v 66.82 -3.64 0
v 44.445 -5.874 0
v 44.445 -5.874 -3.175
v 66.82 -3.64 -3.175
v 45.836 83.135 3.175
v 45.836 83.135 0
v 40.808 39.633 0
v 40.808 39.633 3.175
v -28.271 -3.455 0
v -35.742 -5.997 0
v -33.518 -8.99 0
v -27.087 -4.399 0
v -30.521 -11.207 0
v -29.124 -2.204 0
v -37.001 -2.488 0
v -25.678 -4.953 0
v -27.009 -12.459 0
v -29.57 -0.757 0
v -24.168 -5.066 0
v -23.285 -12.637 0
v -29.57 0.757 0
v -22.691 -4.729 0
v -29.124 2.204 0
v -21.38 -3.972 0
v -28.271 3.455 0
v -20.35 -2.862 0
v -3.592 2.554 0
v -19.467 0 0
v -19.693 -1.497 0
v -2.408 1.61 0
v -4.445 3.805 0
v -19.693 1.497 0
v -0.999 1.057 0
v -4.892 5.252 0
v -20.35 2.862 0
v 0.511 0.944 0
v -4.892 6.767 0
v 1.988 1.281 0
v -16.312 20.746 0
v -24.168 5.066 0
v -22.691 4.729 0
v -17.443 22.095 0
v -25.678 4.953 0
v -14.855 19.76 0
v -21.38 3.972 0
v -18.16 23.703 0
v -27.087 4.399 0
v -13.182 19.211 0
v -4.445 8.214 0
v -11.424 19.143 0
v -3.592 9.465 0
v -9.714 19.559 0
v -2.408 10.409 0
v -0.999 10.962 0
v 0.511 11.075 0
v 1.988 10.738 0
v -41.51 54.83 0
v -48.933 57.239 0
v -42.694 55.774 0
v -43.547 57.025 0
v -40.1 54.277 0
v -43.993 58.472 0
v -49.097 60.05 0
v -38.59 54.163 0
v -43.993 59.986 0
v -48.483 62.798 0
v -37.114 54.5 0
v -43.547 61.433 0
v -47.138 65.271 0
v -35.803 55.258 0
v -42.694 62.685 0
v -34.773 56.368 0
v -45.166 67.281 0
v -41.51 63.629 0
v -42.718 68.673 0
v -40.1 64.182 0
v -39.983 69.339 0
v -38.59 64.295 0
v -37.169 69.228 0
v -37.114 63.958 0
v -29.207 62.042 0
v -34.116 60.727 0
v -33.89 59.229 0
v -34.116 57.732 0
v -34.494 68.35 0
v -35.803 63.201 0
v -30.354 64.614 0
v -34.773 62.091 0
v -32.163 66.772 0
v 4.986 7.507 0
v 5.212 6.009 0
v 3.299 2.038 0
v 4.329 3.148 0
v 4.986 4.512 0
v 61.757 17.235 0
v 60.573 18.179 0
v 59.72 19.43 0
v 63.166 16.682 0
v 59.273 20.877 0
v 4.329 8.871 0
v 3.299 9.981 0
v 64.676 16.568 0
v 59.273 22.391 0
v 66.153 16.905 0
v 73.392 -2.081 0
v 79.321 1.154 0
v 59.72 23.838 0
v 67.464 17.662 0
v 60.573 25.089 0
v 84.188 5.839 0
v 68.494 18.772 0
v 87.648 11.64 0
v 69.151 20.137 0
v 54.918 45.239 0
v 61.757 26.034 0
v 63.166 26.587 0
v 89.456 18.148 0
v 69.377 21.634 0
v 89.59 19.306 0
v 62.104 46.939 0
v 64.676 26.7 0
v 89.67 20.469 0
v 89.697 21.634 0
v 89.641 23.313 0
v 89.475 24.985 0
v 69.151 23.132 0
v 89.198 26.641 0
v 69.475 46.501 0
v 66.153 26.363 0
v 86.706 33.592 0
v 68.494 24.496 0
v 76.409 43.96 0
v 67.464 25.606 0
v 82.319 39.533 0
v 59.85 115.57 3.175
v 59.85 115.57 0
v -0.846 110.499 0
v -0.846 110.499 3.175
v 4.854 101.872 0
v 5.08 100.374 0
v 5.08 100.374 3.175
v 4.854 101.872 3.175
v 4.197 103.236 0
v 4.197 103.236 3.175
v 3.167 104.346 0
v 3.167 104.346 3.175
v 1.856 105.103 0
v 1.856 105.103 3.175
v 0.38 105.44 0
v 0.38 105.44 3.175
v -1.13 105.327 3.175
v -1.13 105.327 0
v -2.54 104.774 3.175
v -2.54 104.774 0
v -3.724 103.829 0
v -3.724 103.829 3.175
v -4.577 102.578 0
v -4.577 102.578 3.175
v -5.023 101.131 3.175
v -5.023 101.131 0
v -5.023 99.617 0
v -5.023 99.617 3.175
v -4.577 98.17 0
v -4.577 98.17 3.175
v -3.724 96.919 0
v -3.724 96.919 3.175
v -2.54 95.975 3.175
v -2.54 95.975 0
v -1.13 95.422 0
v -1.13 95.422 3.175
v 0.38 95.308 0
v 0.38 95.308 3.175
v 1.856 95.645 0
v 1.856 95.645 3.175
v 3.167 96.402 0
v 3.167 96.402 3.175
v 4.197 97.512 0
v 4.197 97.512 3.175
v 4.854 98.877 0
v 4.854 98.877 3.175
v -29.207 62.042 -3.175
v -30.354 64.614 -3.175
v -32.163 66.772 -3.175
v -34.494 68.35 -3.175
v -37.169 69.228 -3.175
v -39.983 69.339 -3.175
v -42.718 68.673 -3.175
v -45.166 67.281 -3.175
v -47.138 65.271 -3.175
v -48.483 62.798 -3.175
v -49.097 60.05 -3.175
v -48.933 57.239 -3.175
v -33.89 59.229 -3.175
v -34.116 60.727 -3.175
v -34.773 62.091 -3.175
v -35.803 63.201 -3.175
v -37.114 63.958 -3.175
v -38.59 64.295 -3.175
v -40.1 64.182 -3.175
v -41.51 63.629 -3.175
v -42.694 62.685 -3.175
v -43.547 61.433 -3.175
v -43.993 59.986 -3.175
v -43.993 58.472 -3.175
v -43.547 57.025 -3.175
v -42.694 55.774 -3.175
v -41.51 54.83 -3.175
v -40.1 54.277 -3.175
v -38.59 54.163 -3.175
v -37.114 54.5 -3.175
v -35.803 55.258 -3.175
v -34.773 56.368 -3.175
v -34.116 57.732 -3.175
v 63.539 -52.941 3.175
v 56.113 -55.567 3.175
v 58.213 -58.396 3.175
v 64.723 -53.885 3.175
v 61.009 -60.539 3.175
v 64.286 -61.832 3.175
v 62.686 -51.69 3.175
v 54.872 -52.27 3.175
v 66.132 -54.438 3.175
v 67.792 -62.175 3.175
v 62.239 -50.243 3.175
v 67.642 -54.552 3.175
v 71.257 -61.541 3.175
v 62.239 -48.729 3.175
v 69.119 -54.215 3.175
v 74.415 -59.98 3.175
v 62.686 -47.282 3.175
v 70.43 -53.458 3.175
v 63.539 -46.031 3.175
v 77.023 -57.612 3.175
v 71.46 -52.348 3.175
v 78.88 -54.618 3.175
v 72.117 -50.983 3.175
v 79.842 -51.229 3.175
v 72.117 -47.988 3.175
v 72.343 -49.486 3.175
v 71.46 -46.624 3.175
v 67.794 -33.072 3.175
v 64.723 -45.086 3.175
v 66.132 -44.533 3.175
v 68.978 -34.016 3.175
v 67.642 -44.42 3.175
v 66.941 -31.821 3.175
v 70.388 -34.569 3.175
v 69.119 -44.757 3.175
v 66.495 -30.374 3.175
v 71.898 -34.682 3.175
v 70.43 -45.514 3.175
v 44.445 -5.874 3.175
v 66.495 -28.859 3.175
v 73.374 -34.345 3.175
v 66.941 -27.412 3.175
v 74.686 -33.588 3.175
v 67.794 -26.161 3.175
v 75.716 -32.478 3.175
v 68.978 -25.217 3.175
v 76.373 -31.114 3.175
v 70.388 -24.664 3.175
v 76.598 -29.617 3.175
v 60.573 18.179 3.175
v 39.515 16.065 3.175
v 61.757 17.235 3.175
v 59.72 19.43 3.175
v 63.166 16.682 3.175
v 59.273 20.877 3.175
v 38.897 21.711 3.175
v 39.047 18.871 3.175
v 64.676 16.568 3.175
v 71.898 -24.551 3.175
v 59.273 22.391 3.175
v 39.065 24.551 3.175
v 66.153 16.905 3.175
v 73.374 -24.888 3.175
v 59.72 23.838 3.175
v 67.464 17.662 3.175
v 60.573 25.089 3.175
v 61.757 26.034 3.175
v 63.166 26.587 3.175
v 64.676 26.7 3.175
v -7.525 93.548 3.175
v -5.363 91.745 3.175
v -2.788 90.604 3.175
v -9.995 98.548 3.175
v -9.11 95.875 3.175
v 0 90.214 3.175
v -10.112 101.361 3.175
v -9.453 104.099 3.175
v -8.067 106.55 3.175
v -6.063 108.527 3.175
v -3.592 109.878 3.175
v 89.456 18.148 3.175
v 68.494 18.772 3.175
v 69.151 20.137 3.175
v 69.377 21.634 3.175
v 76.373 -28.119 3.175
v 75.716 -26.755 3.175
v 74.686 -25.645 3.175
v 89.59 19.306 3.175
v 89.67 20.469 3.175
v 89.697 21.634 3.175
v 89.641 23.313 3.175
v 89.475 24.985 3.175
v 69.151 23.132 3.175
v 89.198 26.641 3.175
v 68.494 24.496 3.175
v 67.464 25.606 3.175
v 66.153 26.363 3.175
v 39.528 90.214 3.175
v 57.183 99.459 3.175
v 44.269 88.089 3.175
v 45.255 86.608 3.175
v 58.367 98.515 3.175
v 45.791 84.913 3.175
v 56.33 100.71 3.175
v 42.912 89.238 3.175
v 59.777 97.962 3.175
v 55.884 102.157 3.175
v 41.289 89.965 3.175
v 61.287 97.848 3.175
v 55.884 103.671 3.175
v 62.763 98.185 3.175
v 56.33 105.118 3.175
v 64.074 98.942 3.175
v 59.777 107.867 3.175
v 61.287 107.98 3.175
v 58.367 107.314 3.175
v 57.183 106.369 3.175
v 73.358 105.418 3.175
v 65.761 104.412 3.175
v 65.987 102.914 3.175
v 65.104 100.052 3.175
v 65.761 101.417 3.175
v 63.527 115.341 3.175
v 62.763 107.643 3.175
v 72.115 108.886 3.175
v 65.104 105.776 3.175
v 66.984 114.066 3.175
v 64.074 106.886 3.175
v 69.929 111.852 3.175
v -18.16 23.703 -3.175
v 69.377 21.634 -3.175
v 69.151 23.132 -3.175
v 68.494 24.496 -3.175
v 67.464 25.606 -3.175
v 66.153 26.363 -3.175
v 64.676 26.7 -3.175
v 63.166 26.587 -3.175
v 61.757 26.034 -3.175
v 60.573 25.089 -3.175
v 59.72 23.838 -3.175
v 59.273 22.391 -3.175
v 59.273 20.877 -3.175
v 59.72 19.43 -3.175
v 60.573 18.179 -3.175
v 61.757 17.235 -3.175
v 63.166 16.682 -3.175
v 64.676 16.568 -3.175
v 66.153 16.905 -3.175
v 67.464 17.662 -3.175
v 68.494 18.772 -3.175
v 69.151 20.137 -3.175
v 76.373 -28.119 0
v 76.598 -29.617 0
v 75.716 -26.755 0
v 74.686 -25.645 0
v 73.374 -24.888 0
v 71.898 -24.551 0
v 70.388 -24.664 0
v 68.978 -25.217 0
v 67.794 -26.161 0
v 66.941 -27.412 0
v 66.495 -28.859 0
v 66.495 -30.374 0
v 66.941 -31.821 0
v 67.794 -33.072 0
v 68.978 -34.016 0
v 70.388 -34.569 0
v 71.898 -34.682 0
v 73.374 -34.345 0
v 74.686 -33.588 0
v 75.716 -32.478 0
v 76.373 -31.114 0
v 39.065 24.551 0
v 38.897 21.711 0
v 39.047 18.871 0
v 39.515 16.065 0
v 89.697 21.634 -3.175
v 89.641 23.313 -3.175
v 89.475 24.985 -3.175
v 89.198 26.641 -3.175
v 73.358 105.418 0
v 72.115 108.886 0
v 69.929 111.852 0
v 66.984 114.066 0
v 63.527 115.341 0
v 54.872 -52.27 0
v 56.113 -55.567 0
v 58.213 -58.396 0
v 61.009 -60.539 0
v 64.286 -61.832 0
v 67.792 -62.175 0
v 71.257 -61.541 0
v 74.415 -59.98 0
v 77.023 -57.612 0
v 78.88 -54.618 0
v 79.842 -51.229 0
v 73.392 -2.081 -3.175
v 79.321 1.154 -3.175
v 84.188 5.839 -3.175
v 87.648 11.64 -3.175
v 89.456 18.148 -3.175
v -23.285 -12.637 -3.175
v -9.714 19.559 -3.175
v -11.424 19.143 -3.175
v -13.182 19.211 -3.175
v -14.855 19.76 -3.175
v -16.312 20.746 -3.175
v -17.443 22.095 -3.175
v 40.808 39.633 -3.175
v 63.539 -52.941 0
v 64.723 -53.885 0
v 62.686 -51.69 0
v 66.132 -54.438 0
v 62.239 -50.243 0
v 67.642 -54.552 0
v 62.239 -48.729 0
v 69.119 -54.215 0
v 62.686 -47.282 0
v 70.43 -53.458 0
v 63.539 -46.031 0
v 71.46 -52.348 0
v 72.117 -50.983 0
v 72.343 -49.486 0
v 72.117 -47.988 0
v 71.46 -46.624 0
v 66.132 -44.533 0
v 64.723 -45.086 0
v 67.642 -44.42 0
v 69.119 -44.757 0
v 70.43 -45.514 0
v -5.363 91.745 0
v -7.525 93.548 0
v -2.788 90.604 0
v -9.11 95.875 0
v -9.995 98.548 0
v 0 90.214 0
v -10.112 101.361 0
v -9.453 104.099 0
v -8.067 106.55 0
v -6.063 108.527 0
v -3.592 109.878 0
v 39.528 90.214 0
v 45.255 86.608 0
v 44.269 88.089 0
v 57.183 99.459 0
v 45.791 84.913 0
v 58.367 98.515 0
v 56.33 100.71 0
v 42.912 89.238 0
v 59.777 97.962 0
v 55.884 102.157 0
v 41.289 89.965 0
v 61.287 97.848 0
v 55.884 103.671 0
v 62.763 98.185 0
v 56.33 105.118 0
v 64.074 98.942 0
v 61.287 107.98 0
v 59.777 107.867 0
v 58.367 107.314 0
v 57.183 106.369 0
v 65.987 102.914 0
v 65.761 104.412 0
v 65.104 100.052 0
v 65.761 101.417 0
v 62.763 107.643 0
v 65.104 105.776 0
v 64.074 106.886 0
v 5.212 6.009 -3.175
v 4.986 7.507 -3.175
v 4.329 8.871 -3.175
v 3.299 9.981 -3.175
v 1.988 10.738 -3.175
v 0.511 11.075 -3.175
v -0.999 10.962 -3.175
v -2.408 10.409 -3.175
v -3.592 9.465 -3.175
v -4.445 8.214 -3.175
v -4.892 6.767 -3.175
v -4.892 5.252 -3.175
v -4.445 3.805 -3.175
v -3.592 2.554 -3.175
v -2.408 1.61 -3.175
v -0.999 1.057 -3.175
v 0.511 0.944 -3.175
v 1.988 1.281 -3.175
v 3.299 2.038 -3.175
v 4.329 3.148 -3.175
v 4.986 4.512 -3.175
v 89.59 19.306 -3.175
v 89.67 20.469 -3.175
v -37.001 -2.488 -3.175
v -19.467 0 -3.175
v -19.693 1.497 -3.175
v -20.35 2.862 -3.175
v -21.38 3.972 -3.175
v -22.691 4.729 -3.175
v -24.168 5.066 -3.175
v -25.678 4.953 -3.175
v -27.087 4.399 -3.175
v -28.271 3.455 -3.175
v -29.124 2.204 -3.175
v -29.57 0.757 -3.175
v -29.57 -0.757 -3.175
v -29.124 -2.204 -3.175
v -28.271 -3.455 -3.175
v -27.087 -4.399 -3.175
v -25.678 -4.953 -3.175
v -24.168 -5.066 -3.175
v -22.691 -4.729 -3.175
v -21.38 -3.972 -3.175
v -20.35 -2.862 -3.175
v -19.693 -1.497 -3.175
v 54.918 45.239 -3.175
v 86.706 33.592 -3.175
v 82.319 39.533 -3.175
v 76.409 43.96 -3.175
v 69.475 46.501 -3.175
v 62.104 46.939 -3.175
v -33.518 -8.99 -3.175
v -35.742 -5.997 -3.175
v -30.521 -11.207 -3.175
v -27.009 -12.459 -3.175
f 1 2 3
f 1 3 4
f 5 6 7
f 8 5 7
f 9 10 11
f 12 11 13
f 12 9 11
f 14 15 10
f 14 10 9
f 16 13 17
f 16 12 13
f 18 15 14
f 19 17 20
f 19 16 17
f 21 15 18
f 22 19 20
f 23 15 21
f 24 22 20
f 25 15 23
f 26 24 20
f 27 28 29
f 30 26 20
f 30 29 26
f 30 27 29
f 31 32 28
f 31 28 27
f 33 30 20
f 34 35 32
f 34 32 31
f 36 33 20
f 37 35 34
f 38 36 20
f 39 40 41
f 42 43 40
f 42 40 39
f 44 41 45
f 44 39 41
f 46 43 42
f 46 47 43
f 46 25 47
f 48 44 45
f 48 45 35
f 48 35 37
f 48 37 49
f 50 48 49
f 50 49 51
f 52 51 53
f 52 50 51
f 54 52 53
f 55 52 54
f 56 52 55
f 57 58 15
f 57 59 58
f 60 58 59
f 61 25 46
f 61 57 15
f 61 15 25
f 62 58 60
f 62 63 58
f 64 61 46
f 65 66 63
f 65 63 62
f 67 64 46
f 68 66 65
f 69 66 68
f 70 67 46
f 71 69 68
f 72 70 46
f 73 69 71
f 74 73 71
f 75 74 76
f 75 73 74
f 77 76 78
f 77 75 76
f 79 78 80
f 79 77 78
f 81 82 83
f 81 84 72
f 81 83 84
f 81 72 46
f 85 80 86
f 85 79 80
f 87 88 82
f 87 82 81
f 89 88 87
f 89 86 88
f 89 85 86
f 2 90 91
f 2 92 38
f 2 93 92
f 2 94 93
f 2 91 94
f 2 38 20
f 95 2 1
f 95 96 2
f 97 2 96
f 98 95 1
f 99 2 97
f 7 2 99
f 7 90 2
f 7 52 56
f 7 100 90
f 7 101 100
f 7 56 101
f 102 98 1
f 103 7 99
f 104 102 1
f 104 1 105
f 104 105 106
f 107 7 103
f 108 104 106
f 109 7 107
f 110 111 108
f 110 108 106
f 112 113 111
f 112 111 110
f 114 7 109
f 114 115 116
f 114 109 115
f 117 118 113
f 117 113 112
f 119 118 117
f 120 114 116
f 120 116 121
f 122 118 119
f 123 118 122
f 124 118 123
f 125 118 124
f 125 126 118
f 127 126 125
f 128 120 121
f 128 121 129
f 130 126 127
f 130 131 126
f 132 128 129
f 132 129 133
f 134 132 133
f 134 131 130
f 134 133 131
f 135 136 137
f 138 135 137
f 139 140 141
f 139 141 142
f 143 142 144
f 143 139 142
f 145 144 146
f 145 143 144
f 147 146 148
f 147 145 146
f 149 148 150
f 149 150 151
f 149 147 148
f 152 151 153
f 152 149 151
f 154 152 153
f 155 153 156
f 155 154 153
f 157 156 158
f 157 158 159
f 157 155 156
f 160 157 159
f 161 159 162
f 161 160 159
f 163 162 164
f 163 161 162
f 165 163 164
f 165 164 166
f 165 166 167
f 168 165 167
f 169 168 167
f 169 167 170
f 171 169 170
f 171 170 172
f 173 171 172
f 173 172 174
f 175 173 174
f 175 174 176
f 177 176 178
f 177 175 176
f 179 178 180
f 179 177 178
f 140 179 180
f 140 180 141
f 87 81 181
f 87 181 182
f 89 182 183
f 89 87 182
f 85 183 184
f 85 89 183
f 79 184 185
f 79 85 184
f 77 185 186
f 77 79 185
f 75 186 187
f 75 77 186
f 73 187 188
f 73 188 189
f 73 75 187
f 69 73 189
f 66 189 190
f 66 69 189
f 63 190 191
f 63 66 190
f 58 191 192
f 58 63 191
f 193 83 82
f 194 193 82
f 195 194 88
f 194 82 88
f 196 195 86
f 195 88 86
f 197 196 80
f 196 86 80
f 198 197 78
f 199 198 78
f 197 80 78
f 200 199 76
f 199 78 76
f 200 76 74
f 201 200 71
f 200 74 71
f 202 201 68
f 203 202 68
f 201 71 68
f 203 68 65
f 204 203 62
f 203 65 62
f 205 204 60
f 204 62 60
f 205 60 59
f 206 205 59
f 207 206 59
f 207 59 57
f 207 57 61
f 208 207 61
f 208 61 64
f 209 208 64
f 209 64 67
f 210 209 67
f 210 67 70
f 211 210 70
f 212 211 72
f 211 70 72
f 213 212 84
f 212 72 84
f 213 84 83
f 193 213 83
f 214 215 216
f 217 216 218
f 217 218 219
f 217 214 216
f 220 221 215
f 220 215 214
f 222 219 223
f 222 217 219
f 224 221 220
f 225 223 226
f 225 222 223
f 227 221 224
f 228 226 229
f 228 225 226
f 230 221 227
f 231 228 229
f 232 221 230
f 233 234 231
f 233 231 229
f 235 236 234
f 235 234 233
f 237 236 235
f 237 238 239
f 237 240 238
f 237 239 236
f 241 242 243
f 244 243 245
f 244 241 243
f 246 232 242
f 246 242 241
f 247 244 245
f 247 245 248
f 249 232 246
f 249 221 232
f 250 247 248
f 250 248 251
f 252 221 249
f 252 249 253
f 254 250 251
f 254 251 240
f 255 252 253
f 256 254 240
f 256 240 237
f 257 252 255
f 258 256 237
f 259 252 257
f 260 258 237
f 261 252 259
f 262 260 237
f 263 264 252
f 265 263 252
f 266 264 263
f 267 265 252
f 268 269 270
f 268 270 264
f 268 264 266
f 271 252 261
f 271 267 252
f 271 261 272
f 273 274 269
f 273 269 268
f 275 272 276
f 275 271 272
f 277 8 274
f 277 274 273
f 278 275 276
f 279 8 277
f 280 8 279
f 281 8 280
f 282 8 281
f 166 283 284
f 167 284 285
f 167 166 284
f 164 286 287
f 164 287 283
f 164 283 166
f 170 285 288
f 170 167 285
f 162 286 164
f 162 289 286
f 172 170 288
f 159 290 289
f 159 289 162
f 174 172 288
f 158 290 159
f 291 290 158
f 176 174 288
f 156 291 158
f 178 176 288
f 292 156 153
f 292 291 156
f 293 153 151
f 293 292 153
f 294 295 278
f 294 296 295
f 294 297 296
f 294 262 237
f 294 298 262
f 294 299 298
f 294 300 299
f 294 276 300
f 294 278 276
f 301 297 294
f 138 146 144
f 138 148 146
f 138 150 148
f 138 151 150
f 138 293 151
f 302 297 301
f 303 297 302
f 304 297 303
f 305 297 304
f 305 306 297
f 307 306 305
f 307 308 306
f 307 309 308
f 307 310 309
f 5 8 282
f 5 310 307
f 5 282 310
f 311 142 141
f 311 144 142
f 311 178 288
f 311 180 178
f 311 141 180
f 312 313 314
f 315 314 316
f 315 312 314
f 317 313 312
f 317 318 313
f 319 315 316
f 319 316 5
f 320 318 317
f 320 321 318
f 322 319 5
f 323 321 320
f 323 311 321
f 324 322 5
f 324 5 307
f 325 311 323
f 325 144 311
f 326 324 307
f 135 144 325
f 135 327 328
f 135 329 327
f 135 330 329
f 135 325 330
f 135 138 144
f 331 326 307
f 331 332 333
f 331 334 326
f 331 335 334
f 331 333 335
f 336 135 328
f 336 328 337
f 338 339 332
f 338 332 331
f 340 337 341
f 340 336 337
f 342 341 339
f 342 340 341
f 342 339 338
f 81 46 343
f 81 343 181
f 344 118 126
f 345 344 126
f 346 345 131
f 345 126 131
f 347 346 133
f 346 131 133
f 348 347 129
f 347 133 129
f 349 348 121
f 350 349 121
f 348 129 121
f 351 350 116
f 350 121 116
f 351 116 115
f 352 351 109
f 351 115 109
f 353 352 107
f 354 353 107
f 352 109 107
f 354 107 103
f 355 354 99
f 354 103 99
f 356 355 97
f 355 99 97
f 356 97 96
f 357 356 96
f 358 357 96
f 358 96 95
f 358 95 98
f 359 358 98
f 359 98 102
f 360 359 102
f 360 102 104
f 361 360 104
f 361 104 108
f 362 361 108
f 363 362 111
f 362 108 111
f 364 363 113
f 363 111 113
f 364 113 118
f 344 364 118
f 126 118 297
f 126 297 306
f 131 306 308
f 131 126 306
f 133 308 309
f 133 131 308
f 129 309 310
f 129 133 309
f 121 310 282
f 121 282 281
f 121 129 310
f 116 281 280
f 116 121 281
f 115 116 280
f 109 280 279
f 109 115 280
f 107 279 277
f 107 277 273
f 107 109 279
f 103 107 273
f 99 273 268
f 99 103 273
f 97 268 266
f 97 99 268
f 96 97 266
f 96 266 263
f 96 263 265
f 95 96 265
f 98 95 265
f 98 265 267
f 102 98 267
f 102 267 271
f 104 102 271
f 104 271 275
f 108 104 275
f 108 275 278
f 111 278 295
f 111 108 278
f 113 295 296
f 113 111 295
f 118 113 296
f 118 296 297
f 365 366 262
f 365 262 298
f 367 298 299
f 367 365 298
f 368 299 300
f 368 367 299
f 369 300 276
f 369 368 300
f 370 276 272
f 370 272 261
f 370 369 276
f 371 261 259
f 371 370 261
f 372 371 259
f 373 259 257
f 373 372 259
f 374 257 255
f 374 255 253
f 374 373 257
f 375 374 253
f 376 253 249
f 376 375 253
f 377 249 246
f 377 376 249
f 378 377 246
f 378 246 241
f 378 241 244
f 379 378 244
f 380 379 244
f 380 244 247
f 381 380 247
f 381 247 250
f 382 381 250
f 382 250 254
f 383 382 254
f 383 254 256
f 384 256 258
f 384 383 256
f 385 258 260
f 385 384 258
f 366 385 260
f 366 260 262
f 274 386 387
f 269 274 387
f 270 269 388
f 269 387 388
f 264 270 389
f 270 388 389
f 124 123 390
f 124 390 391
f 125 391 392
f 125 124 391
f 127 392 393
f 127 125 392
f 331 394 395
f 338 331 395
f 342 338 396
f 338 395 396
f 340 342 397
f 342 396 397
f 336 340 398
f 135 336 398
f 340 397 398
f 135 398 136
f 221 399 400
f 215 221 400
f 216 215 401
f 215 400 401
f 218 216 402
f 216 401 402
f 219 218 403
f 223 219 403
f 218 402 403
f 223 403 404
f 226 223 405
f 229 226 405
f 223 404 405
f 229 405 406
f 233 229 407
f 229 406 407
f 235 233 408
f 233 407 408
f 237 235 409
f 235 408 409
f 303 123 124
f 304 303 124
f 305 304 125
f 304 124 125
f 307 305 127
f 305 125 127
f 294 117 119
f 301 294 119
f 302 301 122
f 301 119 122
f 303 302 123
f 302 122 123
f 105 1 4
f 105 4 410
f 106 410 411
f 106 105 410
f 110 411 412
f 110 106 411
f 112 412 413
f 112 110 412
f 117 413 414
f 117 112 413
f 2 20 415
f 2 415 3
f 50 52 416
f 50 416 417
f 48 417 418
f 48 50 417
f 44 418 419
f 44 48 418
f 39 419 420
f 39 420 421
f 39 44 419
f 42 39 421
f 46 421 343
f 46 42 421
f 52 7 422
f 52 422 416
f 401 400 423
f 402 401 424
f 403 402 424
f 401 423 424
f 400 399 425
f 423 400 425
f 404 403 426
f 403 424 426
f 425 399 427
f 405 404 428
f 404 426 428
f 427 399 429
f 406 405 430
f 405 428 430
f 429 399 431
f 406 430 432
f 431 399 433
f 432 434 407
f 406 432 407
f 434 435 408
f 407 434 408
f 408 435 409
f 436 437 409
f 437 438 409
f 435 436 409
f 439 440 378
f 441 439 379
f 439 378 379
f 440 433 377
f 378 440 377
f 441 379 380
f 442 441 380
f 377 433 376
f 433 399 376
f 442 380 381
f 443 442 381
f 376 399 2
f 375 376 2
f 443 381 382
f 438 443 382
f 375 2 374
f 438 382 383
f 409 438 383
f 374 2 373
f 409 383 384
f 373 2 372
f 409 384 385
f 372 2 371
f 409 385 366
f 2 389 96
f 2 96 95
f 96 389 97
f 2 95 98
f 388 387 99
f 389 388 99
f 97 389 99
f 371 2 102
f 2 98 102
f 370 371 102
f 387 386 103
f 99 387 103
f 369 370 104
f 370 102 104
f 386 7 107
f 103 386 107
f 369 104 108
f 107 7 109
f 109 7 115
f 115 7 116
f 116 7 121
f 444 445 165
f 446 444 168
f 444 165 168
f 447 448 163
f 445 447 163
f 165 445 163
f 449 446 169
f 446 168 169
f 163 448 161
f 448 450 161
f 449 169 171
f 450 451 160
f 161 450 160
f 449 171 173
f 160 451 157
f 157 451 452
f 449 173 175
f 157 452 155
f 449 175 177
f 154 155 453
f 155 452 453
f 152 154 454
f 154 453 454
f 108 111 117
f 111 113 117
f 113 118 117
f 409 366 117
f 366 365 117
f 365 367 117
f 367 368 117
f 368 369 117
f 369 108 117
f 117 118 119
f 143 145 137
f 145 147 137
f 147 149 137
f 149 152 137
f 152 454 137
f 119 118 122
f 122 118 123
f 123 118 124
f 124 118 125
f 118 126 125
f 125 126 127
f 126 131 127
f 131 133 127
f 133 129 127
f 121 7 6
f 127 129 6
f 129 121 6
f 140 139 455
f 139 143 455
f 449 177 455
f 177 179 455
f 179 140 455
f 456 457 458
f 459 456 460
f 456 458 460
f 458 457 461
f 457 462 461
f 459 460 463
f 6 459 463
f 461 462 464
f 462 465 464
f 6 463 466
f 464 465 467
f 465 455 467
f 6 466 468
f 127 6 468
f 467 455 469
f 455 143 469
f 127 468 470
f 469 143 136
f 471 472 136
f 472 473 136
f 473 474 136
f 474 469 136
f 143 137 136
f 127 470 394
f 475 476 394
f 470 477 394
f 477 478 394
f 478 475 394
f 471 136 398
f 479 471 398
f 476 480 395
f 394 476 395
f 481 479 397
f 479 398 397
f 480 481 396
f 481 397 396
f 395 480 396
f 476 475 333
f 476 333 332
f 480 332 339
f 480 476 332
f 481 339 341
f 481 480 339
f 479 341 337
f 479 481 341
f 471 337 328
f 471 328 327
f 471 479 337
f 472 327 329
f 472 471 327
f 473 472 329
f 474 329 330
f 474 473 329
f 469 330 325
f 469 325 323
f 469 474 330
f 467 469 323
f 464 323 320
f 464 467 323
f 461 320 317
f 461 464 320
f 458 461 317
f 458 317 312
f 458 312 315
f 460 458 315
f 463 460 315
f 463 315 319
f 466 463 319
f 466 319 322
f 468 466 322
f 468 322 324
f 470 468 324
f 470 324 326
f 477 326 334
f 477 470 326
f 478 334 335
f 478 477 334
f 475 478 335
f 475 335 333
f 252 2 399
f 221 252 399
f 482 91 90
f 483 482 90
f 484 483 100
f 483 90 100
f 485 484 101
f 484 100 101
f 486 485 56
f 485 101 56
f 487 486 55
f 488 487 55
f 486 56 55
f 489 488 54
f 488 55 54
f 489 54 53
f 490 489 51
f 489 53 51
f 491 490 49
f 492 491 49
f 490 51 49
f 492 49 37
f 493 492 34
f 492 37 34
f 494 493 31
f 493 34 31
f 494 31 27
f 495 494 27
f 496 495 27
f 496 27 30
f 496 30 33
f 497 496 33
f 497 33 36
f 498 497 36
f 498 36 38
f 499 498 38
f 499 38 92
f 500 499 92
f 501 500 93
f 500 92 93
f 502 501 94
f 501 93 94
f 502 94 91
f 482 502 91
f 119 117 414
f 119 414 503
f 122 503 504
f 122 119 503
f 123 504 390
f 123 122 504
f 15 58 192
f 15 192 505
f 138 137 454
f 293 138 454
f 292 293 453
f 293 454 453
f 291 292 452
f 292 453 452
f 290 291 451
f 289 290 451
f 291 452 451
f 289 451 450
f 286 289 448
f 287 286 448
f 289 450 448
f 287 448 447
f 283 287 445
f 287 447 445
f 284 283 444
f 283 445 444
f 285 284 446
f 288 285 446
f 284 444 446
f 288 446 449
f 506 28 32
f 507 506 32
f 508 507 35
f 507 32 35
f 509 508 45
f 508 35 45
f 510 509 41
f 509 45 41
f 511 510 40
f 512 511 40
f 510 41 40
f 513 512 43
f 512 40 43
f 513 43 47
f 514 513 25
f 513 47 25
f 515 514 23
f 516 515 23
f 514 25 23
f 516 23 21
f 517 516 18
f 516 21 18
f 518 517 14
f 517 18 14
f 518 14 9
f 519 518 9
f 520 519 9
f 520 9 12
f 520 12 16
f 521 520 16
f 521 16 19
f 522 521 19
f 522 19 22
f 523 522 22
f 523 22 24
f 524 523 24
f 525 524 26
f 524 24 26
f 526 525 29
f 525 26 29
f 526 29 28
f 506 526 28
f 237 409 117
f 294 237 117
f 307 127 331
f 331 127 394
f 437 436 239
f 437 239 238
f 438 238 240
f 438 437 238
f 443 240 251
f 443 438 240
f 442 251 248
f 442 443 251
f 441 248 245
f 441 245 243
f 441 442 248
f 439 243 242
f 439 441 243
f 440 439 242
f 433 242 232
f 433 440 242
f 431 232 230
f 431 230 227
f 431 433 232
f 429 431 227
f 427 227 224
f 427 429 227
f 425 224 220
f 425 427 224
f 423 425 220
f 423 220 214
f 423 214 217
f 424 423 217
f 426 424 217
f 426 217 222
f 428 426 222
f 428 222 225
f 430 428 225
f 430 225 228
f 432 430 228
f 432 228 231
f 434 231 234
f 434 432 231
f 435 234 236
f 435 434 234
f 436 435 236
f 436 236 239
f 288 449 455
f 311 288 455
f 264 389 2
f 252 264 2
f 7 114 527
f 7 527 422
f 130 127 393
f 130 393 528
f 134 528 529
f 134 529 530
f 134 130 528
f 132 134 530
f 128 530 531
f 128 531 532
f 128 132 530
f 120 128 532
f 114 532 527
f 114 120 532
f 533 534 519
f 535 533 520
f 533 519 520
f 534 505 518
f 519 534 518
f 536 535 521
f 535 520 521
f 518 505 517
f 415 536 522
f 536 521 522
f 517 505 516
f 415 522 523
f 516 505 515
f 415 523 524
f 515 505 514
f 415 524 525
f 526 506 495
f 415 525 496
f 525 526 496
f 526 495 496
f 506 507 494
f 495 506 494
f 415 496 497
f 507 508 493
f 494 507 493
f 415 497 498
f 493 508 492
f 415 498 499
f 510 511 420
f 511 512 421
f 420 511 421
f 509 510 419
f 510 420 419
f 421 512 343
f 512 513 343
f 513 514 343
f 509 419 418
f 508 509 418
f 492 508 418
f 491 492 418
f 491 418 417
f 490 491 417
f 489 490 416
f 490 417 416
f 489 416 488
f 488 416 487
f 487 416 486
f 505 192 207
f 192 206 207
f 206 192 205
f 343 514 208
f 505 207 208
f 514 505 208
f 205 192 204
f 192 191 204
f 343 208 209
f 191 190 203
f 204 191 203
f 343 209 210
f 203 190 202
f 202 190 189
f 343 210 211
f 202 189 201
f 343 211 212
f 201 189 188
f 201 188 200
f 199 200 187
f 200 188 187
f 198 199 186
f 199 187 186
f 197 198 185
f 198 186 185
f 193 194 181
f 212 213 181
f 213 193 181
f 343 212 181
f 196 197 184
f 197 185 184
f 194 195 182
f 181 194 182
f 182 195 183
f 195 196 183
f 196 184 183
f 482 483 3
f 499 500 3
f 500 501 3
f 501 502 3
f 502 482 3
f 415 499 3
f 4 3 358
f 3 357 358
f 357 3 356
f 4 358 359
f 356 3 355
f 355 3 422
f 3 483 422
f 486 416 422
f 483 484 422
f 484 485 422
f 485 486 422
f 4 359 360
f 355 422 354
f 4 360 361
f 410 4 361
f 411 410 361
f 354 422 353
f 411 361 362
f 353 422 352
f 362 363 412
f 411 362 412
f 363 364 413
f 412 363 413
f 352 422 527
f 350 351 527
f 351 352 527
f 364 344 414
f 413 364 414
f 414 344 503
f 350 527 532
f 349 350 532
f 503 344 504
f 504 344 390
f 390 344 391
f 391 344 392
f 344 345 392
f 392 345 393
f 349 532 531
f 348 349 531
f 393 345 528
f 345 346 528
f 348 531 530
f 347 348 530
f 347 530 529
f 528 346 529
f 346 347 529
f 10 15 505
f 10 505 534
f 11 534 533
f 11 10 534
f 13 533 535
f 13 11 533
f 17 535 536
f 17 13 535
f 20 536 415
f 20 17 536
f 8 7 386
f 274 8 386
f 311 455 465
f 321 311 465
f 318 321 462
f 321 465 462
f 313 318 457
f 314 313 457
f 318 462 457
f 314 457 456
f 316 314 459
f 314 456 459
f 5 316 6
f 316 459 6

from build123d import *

# Parameters (mm, degrees)
F0_R     = 5.08
F1_DEPTH = 3.175
F2_DEPTH = 3.175


# Not quite as in the source:
# - a feature names something its author has since deleted; it is built from what else it names


with BuildPart() as f1:
    # F0 (on Top) → F1 (new body)
    with BuildSketch(Plane.XY):
        with BuildLine():
            ThreePointArc((10.16, 100.3741442614), (6.8786240281, 107.8514520309), (-0.8459313937, 110.4988664836))
            ThreePointArc((-0.8459313937, 110.4988664836), (-10.1511767243, 99.9508109281), (0, 90.2141442614))
            ThreePointArc((0, 90.2141442614), (7.1842048969, 93.1899393645), (10.16, 100.3741442614))
        make_face()
        with Locations((0, 100.3741442614)):
            Circle(F0_R, mode=Mode.SUBTRACT)
        with BuildLine():
            ThreePointArc((54.8716142506, -52.2704518609), (67.7917463532, -62.174826644), (79.8423690943, -51.229099398))
            ThreePointArc((79.8423690943, -51.229099398), (79.9324913965, -50.3595474809), (79.9625796865, -49.4858557386))
            ThreePointArc((79.9625796865, -49.4858557386), (65.8617336987, -36.8633508161), (54.8716142506, -52.2704518609))
        make_face()
        with Locations((67.2625796865, -49.4858557386)):
            Circle(F0_R, mode=Mode.SUBTRACT)
        with BuildLine():
            ThreePointArc((73.3578412331, 105.4177527176), (73.5446019833, 104.1721352658), (73.6070603461, 102.9141442614))
            ThreePointArc((73.6070603461, 102.9141442614), (52.3087803109, 93.5675095495), (59.849646104, 115.5700470392))
            Line((59.849646104, 115.5700470392), (-0.8459313937, 110.4988664836))
            ThreePointArc((-0.8459313937, 110.4988664836), (6.8786240281, 107.8514520309), (10.16, 100.3741442614))
            ThreePointArc((10.16, 100.3741442614), (7.1842048969, 93.1899393645), (0, 90.2141442614))
            Line((0, 90.2141442614), (39.5282835187, 90.2141442614))
            ThreePointArc((39.5282835187, 90.2141442614), (44.2691931384, 88.0886295528), (45.8362844499, 83.135018585))
            Line((45.8362844499, 83.135018585), (40.8079958174, 39.6329853928))
            Line((40.8079958174, 39.6329853928), (54.917810899, 45.2391646928))
            ThreePointArc((54.917810899, 45.2391646928), (76.4089843694, 43.9601796602), (89.1982324351, 26.6413611739))
            Line((89.1982324351, 26.6413611739), (73.3578412331, 105.4177527176))
        make_face()
        with BuildLine():
            ThreePointArc((39.0646669362, 24.550646967), (44.1352803506, 37.083362389), (54.917810899, 45.2391646928))
            Line((54.917810899, 45.2391646928), (40.8079958174, 39.6329853928))
            Line((40.8079958174, 39.6329853928), (39.0646669362, 24.550646967))
        make_face()
        with BuildLine():
            Line((44.4451075952, -5.8743218991), (66.8202917314, -3.6401774247))
            ThreePointArc((66.8202917314, -3.6401774247), (49.4329187665, 1.0373270408), (39.514739789, 16.0649520167))
            Line((39.514739789, 16.0649520167), (44.4451075952, -5.8743218991))
        make_face()
        with BuildLine():
            ThreePointArc((59.849646104, 115.5700470392), (52.3087803109, 93.5675095495), (73.6070603461, 102.9141442614))
            ThreePointArc((73.6070603461, 102.9141442614), (73.5446019833, 104.1721352658), (73.3578412331, 105.4177527176))
            ThreePointArc((73.3578412331, 105.4177527176), (68.5372288157, 113.0665099525), (59.849646104, 115.5700470392))
        make_face()
        with Locations((60.9070603461, 102.9141442614)):
            Circle(F0_R, mode=Mode.SUBTRACT)
        with BuildLine():
            Line((79.8423690943, -51.229099398), (89.4562494765, 18.1476569426))
            ThreePointArc((89.4562494765, 18.1476569426), (81.9110772813, 3.3340710535), (66.8202917314, -3.6401774247))
            Line((66.8202917314, -3.6401774247), (44.4451075952, -5.8743218991))
            Line((44.4451075952, -5.8743218991), (54.8716142506, -52.2704518609))
            ThreePointArc((54.8716142506, -52.2704518609), (65.8617336987, -36.8633508161), (79.9625796865, -49.4858557386))
            ThreePointArc((79.9625796865, -49.4858557386), (79.9324913965, -50.3595474809), (79.8423690943, -51.229099398))
        make_face()
        with Locations((71.5183865738, -29.616519873)):
            Circle(F0_R, mode=Mode.SUBTRACT)
        with BuildLine():
            ThreePointArc((89.696670661, 21.6341442614), (89.5717539355, 24.1501262702), (89.1982324351, 26.6413611739))
            ThreePointArc((89.1982324351, 26.6413611739), (76.4089843694, 43.9601796602), (54.917810899, 45.2391646928))
            ThreePointArc((54.917810899, 45.2391646928), (44.1352803506, 37.083362389), (39.0646669362, 24.550646967))
            ThreePointArc((39.0646669362, 24.550646967), (38.9323222925, 20.288844354), (39.514739789, 16.0649520167))
            ThreePointArc((39.514739789, 16.0649520167), (49.4329187665, 1.0373270408), (66.8202917314, -3.6401774247))
            ThreePointArc((66.8202917314, -3.6401774247), (81.9110772813, 3.3340710535), (89.4562494765, 18.1476569426))
            ThreePointArc((89.4562494765, 18.1476569426), (89.636494081, 19.8867607767), (89.696670661, 21.6341442614))
        make_face()
        with Locations((64.296670661, 21.6341442614)):
            Circle(F0_R, mode=Mode.SUBTRACT)
    extrude(amount=F1_DEPTH)


with BuildPart() as f2:
    # F0 (on Top) → F2 (new body)
    with BuildSketch(Plane.XY):
        with BuildLine():
            ThreePointArc((-28.8099856228, 59.2292622952), (-28.9097724352, 60.6497237067), (-29.207172753, 62.0422828905))
            ThreePointArc((-29.207172753, 62.0422828905), (-41.3737794296, 69.1008060111), (-48.9331146431, 57.2388703429))
            ThreePointArc((-48.9331146431, 57.2388703429), (-37.9699333358, 49.1185998331), (-28.8099856228, 59.2292622952))
        make_face()
        with Locations((-38.9699856228, 59.2292622952)):
            Circle(F0_R, mode=Mode.SUBTRACT)
        with BuildLine():
            ThreePointArc((-37.0011340573, -2.4879899404), (-32.1015061527, -10.2089569865), (-23.2854122466, -12.6371608431))
            ThreePointArc((-23.2854122466, -12.6371608431), (-15.1314117759, -8.5224704811), (-11.8472227818, 0))
            ThreePointArc((-11.8472227818, 0), (-25.7972881405, 12.6383280777), (-37.0011340573, -2.4879899404))
        make_face()
        with Locations((-24.5472227818, 0)):
            Circle(F0_R, mode=Mode.SUBTRACT)
        with BuildLine():
            ThreePointArc((39.0646669362, 24.550646967), (44.1352803506, 37.083362389), (54.917810899, 45.2391646928))
            Line((54.917810899, 45.2391646928), (40.8079958174, 39.6329853928))
            Line((40.8079958174, 39.6329853928), (39.0646669362, 24.550646967))
        make_face()
        with BuildLine():
            Line((44.4451075952, -5.8743218991), (66.8202917314, -3.6401774247))
            ThreePointArc((66.8202917314, -3.6401774247), (49.4329187665, 1.0373270408), (39.514739789, 16.0649520167))
            Line((39.514739789, 16.0649520167), (44.4451075952, -5.8743218991))
        make_face()
        with BuildLine():
            ThreePointArc((89.696670661, 21.6341442614), (89.5717539355, 24.1501262702), (89.1982324351, 26.6413611739))
            ThreePointArc((89.1982324351, 26.6413611739), (76.4089843694, 43.9601796602), (54.917810899, 45.2391646928))
            ThreePointArc((54.917810899, 45.2391646928), (44.1352803506, 37.083362389), (39.0646669362, 24.550646967))
            ThreePointArc((39.0646669362, 24.550646967), (38.9323222925, 20.288844354), (39.514739789, 16.0649520167))
            ThreePointArc((39.514739789, 16.0649520167), (49.4329187665, 1.0373270408), (66.8202917314, -3.6401774247))
            ThreePointArc((66.8202917314, -3.6401774247), (81.9110772813, 3.3340710535), (89.4562494765, 18.1476569426))
            ThreePointArc((89.4562494765, 18.1476569426), (89.636494081, 19.8867607767), (89.696670661, 21.6341442614))
        make_face()
        with Locations((64.296670661, 21.6341442614)):
            Circle(F0_R, mode=Mode.SUBTRACT)
        with BuildLine():
            ThreePointArc((39.514739789, 16.0649520167), (38.9323222925, 20.288844354), (39.0646669362, 24.550646967))
            Line((39.0646669362, 24.550646967), (40.8079958174, 39.6329853928))
            Line((40.8079958174, 39.6329853928), (-9.7136466081, 19.5594844768))
            ThreePointArc((-9.7136466081, 19.5594844768), (-14.8548233, 19.7596605926), (-18.1601195922, 23.7026017126))
            Line((-18.1601195922, 23.7026017126), (-29.207172753, 62.0422828905))
            ThreePointArc((-29.207172753, 62.0422828905), (-28.9097724352, 60.6497237067), (-28.8099856228, 59.2292622952))
            ThreePointArc((-28.8099856228, 59.2292622952), (-37.9699333358, 49.1185998331), (-48.9331146431, 57.2388703429))
            Line((-48.9331146431, 57.2388703429), (-37.0011340573, -2.4879899404))
            ThreePointArc((-37.0011340573, -2.4879899404), (-25.7972881405, 12.6383280777), (-11.8472227818, 0))
            ThreePointArc((-11.8472227818, 0), (-15.1314117759, -8.5224704811), (-23.2854122466, -12.6371608431))
            Line((-23.2854122466, -12.6371608431), (44.4451075952, -5.8743218991))
            Line((44.4451075952, -5.8743218991), (39.514739789, 16.0649520167))
        make_face()
        with Locations((0.1316365078, 6.0094845171)):
            Circle(F0_R, mode=Mode.SUBTRACT)
    extrude(amount=-F2_DEPTH)


solid = Compound([f1.part, f2.part])
